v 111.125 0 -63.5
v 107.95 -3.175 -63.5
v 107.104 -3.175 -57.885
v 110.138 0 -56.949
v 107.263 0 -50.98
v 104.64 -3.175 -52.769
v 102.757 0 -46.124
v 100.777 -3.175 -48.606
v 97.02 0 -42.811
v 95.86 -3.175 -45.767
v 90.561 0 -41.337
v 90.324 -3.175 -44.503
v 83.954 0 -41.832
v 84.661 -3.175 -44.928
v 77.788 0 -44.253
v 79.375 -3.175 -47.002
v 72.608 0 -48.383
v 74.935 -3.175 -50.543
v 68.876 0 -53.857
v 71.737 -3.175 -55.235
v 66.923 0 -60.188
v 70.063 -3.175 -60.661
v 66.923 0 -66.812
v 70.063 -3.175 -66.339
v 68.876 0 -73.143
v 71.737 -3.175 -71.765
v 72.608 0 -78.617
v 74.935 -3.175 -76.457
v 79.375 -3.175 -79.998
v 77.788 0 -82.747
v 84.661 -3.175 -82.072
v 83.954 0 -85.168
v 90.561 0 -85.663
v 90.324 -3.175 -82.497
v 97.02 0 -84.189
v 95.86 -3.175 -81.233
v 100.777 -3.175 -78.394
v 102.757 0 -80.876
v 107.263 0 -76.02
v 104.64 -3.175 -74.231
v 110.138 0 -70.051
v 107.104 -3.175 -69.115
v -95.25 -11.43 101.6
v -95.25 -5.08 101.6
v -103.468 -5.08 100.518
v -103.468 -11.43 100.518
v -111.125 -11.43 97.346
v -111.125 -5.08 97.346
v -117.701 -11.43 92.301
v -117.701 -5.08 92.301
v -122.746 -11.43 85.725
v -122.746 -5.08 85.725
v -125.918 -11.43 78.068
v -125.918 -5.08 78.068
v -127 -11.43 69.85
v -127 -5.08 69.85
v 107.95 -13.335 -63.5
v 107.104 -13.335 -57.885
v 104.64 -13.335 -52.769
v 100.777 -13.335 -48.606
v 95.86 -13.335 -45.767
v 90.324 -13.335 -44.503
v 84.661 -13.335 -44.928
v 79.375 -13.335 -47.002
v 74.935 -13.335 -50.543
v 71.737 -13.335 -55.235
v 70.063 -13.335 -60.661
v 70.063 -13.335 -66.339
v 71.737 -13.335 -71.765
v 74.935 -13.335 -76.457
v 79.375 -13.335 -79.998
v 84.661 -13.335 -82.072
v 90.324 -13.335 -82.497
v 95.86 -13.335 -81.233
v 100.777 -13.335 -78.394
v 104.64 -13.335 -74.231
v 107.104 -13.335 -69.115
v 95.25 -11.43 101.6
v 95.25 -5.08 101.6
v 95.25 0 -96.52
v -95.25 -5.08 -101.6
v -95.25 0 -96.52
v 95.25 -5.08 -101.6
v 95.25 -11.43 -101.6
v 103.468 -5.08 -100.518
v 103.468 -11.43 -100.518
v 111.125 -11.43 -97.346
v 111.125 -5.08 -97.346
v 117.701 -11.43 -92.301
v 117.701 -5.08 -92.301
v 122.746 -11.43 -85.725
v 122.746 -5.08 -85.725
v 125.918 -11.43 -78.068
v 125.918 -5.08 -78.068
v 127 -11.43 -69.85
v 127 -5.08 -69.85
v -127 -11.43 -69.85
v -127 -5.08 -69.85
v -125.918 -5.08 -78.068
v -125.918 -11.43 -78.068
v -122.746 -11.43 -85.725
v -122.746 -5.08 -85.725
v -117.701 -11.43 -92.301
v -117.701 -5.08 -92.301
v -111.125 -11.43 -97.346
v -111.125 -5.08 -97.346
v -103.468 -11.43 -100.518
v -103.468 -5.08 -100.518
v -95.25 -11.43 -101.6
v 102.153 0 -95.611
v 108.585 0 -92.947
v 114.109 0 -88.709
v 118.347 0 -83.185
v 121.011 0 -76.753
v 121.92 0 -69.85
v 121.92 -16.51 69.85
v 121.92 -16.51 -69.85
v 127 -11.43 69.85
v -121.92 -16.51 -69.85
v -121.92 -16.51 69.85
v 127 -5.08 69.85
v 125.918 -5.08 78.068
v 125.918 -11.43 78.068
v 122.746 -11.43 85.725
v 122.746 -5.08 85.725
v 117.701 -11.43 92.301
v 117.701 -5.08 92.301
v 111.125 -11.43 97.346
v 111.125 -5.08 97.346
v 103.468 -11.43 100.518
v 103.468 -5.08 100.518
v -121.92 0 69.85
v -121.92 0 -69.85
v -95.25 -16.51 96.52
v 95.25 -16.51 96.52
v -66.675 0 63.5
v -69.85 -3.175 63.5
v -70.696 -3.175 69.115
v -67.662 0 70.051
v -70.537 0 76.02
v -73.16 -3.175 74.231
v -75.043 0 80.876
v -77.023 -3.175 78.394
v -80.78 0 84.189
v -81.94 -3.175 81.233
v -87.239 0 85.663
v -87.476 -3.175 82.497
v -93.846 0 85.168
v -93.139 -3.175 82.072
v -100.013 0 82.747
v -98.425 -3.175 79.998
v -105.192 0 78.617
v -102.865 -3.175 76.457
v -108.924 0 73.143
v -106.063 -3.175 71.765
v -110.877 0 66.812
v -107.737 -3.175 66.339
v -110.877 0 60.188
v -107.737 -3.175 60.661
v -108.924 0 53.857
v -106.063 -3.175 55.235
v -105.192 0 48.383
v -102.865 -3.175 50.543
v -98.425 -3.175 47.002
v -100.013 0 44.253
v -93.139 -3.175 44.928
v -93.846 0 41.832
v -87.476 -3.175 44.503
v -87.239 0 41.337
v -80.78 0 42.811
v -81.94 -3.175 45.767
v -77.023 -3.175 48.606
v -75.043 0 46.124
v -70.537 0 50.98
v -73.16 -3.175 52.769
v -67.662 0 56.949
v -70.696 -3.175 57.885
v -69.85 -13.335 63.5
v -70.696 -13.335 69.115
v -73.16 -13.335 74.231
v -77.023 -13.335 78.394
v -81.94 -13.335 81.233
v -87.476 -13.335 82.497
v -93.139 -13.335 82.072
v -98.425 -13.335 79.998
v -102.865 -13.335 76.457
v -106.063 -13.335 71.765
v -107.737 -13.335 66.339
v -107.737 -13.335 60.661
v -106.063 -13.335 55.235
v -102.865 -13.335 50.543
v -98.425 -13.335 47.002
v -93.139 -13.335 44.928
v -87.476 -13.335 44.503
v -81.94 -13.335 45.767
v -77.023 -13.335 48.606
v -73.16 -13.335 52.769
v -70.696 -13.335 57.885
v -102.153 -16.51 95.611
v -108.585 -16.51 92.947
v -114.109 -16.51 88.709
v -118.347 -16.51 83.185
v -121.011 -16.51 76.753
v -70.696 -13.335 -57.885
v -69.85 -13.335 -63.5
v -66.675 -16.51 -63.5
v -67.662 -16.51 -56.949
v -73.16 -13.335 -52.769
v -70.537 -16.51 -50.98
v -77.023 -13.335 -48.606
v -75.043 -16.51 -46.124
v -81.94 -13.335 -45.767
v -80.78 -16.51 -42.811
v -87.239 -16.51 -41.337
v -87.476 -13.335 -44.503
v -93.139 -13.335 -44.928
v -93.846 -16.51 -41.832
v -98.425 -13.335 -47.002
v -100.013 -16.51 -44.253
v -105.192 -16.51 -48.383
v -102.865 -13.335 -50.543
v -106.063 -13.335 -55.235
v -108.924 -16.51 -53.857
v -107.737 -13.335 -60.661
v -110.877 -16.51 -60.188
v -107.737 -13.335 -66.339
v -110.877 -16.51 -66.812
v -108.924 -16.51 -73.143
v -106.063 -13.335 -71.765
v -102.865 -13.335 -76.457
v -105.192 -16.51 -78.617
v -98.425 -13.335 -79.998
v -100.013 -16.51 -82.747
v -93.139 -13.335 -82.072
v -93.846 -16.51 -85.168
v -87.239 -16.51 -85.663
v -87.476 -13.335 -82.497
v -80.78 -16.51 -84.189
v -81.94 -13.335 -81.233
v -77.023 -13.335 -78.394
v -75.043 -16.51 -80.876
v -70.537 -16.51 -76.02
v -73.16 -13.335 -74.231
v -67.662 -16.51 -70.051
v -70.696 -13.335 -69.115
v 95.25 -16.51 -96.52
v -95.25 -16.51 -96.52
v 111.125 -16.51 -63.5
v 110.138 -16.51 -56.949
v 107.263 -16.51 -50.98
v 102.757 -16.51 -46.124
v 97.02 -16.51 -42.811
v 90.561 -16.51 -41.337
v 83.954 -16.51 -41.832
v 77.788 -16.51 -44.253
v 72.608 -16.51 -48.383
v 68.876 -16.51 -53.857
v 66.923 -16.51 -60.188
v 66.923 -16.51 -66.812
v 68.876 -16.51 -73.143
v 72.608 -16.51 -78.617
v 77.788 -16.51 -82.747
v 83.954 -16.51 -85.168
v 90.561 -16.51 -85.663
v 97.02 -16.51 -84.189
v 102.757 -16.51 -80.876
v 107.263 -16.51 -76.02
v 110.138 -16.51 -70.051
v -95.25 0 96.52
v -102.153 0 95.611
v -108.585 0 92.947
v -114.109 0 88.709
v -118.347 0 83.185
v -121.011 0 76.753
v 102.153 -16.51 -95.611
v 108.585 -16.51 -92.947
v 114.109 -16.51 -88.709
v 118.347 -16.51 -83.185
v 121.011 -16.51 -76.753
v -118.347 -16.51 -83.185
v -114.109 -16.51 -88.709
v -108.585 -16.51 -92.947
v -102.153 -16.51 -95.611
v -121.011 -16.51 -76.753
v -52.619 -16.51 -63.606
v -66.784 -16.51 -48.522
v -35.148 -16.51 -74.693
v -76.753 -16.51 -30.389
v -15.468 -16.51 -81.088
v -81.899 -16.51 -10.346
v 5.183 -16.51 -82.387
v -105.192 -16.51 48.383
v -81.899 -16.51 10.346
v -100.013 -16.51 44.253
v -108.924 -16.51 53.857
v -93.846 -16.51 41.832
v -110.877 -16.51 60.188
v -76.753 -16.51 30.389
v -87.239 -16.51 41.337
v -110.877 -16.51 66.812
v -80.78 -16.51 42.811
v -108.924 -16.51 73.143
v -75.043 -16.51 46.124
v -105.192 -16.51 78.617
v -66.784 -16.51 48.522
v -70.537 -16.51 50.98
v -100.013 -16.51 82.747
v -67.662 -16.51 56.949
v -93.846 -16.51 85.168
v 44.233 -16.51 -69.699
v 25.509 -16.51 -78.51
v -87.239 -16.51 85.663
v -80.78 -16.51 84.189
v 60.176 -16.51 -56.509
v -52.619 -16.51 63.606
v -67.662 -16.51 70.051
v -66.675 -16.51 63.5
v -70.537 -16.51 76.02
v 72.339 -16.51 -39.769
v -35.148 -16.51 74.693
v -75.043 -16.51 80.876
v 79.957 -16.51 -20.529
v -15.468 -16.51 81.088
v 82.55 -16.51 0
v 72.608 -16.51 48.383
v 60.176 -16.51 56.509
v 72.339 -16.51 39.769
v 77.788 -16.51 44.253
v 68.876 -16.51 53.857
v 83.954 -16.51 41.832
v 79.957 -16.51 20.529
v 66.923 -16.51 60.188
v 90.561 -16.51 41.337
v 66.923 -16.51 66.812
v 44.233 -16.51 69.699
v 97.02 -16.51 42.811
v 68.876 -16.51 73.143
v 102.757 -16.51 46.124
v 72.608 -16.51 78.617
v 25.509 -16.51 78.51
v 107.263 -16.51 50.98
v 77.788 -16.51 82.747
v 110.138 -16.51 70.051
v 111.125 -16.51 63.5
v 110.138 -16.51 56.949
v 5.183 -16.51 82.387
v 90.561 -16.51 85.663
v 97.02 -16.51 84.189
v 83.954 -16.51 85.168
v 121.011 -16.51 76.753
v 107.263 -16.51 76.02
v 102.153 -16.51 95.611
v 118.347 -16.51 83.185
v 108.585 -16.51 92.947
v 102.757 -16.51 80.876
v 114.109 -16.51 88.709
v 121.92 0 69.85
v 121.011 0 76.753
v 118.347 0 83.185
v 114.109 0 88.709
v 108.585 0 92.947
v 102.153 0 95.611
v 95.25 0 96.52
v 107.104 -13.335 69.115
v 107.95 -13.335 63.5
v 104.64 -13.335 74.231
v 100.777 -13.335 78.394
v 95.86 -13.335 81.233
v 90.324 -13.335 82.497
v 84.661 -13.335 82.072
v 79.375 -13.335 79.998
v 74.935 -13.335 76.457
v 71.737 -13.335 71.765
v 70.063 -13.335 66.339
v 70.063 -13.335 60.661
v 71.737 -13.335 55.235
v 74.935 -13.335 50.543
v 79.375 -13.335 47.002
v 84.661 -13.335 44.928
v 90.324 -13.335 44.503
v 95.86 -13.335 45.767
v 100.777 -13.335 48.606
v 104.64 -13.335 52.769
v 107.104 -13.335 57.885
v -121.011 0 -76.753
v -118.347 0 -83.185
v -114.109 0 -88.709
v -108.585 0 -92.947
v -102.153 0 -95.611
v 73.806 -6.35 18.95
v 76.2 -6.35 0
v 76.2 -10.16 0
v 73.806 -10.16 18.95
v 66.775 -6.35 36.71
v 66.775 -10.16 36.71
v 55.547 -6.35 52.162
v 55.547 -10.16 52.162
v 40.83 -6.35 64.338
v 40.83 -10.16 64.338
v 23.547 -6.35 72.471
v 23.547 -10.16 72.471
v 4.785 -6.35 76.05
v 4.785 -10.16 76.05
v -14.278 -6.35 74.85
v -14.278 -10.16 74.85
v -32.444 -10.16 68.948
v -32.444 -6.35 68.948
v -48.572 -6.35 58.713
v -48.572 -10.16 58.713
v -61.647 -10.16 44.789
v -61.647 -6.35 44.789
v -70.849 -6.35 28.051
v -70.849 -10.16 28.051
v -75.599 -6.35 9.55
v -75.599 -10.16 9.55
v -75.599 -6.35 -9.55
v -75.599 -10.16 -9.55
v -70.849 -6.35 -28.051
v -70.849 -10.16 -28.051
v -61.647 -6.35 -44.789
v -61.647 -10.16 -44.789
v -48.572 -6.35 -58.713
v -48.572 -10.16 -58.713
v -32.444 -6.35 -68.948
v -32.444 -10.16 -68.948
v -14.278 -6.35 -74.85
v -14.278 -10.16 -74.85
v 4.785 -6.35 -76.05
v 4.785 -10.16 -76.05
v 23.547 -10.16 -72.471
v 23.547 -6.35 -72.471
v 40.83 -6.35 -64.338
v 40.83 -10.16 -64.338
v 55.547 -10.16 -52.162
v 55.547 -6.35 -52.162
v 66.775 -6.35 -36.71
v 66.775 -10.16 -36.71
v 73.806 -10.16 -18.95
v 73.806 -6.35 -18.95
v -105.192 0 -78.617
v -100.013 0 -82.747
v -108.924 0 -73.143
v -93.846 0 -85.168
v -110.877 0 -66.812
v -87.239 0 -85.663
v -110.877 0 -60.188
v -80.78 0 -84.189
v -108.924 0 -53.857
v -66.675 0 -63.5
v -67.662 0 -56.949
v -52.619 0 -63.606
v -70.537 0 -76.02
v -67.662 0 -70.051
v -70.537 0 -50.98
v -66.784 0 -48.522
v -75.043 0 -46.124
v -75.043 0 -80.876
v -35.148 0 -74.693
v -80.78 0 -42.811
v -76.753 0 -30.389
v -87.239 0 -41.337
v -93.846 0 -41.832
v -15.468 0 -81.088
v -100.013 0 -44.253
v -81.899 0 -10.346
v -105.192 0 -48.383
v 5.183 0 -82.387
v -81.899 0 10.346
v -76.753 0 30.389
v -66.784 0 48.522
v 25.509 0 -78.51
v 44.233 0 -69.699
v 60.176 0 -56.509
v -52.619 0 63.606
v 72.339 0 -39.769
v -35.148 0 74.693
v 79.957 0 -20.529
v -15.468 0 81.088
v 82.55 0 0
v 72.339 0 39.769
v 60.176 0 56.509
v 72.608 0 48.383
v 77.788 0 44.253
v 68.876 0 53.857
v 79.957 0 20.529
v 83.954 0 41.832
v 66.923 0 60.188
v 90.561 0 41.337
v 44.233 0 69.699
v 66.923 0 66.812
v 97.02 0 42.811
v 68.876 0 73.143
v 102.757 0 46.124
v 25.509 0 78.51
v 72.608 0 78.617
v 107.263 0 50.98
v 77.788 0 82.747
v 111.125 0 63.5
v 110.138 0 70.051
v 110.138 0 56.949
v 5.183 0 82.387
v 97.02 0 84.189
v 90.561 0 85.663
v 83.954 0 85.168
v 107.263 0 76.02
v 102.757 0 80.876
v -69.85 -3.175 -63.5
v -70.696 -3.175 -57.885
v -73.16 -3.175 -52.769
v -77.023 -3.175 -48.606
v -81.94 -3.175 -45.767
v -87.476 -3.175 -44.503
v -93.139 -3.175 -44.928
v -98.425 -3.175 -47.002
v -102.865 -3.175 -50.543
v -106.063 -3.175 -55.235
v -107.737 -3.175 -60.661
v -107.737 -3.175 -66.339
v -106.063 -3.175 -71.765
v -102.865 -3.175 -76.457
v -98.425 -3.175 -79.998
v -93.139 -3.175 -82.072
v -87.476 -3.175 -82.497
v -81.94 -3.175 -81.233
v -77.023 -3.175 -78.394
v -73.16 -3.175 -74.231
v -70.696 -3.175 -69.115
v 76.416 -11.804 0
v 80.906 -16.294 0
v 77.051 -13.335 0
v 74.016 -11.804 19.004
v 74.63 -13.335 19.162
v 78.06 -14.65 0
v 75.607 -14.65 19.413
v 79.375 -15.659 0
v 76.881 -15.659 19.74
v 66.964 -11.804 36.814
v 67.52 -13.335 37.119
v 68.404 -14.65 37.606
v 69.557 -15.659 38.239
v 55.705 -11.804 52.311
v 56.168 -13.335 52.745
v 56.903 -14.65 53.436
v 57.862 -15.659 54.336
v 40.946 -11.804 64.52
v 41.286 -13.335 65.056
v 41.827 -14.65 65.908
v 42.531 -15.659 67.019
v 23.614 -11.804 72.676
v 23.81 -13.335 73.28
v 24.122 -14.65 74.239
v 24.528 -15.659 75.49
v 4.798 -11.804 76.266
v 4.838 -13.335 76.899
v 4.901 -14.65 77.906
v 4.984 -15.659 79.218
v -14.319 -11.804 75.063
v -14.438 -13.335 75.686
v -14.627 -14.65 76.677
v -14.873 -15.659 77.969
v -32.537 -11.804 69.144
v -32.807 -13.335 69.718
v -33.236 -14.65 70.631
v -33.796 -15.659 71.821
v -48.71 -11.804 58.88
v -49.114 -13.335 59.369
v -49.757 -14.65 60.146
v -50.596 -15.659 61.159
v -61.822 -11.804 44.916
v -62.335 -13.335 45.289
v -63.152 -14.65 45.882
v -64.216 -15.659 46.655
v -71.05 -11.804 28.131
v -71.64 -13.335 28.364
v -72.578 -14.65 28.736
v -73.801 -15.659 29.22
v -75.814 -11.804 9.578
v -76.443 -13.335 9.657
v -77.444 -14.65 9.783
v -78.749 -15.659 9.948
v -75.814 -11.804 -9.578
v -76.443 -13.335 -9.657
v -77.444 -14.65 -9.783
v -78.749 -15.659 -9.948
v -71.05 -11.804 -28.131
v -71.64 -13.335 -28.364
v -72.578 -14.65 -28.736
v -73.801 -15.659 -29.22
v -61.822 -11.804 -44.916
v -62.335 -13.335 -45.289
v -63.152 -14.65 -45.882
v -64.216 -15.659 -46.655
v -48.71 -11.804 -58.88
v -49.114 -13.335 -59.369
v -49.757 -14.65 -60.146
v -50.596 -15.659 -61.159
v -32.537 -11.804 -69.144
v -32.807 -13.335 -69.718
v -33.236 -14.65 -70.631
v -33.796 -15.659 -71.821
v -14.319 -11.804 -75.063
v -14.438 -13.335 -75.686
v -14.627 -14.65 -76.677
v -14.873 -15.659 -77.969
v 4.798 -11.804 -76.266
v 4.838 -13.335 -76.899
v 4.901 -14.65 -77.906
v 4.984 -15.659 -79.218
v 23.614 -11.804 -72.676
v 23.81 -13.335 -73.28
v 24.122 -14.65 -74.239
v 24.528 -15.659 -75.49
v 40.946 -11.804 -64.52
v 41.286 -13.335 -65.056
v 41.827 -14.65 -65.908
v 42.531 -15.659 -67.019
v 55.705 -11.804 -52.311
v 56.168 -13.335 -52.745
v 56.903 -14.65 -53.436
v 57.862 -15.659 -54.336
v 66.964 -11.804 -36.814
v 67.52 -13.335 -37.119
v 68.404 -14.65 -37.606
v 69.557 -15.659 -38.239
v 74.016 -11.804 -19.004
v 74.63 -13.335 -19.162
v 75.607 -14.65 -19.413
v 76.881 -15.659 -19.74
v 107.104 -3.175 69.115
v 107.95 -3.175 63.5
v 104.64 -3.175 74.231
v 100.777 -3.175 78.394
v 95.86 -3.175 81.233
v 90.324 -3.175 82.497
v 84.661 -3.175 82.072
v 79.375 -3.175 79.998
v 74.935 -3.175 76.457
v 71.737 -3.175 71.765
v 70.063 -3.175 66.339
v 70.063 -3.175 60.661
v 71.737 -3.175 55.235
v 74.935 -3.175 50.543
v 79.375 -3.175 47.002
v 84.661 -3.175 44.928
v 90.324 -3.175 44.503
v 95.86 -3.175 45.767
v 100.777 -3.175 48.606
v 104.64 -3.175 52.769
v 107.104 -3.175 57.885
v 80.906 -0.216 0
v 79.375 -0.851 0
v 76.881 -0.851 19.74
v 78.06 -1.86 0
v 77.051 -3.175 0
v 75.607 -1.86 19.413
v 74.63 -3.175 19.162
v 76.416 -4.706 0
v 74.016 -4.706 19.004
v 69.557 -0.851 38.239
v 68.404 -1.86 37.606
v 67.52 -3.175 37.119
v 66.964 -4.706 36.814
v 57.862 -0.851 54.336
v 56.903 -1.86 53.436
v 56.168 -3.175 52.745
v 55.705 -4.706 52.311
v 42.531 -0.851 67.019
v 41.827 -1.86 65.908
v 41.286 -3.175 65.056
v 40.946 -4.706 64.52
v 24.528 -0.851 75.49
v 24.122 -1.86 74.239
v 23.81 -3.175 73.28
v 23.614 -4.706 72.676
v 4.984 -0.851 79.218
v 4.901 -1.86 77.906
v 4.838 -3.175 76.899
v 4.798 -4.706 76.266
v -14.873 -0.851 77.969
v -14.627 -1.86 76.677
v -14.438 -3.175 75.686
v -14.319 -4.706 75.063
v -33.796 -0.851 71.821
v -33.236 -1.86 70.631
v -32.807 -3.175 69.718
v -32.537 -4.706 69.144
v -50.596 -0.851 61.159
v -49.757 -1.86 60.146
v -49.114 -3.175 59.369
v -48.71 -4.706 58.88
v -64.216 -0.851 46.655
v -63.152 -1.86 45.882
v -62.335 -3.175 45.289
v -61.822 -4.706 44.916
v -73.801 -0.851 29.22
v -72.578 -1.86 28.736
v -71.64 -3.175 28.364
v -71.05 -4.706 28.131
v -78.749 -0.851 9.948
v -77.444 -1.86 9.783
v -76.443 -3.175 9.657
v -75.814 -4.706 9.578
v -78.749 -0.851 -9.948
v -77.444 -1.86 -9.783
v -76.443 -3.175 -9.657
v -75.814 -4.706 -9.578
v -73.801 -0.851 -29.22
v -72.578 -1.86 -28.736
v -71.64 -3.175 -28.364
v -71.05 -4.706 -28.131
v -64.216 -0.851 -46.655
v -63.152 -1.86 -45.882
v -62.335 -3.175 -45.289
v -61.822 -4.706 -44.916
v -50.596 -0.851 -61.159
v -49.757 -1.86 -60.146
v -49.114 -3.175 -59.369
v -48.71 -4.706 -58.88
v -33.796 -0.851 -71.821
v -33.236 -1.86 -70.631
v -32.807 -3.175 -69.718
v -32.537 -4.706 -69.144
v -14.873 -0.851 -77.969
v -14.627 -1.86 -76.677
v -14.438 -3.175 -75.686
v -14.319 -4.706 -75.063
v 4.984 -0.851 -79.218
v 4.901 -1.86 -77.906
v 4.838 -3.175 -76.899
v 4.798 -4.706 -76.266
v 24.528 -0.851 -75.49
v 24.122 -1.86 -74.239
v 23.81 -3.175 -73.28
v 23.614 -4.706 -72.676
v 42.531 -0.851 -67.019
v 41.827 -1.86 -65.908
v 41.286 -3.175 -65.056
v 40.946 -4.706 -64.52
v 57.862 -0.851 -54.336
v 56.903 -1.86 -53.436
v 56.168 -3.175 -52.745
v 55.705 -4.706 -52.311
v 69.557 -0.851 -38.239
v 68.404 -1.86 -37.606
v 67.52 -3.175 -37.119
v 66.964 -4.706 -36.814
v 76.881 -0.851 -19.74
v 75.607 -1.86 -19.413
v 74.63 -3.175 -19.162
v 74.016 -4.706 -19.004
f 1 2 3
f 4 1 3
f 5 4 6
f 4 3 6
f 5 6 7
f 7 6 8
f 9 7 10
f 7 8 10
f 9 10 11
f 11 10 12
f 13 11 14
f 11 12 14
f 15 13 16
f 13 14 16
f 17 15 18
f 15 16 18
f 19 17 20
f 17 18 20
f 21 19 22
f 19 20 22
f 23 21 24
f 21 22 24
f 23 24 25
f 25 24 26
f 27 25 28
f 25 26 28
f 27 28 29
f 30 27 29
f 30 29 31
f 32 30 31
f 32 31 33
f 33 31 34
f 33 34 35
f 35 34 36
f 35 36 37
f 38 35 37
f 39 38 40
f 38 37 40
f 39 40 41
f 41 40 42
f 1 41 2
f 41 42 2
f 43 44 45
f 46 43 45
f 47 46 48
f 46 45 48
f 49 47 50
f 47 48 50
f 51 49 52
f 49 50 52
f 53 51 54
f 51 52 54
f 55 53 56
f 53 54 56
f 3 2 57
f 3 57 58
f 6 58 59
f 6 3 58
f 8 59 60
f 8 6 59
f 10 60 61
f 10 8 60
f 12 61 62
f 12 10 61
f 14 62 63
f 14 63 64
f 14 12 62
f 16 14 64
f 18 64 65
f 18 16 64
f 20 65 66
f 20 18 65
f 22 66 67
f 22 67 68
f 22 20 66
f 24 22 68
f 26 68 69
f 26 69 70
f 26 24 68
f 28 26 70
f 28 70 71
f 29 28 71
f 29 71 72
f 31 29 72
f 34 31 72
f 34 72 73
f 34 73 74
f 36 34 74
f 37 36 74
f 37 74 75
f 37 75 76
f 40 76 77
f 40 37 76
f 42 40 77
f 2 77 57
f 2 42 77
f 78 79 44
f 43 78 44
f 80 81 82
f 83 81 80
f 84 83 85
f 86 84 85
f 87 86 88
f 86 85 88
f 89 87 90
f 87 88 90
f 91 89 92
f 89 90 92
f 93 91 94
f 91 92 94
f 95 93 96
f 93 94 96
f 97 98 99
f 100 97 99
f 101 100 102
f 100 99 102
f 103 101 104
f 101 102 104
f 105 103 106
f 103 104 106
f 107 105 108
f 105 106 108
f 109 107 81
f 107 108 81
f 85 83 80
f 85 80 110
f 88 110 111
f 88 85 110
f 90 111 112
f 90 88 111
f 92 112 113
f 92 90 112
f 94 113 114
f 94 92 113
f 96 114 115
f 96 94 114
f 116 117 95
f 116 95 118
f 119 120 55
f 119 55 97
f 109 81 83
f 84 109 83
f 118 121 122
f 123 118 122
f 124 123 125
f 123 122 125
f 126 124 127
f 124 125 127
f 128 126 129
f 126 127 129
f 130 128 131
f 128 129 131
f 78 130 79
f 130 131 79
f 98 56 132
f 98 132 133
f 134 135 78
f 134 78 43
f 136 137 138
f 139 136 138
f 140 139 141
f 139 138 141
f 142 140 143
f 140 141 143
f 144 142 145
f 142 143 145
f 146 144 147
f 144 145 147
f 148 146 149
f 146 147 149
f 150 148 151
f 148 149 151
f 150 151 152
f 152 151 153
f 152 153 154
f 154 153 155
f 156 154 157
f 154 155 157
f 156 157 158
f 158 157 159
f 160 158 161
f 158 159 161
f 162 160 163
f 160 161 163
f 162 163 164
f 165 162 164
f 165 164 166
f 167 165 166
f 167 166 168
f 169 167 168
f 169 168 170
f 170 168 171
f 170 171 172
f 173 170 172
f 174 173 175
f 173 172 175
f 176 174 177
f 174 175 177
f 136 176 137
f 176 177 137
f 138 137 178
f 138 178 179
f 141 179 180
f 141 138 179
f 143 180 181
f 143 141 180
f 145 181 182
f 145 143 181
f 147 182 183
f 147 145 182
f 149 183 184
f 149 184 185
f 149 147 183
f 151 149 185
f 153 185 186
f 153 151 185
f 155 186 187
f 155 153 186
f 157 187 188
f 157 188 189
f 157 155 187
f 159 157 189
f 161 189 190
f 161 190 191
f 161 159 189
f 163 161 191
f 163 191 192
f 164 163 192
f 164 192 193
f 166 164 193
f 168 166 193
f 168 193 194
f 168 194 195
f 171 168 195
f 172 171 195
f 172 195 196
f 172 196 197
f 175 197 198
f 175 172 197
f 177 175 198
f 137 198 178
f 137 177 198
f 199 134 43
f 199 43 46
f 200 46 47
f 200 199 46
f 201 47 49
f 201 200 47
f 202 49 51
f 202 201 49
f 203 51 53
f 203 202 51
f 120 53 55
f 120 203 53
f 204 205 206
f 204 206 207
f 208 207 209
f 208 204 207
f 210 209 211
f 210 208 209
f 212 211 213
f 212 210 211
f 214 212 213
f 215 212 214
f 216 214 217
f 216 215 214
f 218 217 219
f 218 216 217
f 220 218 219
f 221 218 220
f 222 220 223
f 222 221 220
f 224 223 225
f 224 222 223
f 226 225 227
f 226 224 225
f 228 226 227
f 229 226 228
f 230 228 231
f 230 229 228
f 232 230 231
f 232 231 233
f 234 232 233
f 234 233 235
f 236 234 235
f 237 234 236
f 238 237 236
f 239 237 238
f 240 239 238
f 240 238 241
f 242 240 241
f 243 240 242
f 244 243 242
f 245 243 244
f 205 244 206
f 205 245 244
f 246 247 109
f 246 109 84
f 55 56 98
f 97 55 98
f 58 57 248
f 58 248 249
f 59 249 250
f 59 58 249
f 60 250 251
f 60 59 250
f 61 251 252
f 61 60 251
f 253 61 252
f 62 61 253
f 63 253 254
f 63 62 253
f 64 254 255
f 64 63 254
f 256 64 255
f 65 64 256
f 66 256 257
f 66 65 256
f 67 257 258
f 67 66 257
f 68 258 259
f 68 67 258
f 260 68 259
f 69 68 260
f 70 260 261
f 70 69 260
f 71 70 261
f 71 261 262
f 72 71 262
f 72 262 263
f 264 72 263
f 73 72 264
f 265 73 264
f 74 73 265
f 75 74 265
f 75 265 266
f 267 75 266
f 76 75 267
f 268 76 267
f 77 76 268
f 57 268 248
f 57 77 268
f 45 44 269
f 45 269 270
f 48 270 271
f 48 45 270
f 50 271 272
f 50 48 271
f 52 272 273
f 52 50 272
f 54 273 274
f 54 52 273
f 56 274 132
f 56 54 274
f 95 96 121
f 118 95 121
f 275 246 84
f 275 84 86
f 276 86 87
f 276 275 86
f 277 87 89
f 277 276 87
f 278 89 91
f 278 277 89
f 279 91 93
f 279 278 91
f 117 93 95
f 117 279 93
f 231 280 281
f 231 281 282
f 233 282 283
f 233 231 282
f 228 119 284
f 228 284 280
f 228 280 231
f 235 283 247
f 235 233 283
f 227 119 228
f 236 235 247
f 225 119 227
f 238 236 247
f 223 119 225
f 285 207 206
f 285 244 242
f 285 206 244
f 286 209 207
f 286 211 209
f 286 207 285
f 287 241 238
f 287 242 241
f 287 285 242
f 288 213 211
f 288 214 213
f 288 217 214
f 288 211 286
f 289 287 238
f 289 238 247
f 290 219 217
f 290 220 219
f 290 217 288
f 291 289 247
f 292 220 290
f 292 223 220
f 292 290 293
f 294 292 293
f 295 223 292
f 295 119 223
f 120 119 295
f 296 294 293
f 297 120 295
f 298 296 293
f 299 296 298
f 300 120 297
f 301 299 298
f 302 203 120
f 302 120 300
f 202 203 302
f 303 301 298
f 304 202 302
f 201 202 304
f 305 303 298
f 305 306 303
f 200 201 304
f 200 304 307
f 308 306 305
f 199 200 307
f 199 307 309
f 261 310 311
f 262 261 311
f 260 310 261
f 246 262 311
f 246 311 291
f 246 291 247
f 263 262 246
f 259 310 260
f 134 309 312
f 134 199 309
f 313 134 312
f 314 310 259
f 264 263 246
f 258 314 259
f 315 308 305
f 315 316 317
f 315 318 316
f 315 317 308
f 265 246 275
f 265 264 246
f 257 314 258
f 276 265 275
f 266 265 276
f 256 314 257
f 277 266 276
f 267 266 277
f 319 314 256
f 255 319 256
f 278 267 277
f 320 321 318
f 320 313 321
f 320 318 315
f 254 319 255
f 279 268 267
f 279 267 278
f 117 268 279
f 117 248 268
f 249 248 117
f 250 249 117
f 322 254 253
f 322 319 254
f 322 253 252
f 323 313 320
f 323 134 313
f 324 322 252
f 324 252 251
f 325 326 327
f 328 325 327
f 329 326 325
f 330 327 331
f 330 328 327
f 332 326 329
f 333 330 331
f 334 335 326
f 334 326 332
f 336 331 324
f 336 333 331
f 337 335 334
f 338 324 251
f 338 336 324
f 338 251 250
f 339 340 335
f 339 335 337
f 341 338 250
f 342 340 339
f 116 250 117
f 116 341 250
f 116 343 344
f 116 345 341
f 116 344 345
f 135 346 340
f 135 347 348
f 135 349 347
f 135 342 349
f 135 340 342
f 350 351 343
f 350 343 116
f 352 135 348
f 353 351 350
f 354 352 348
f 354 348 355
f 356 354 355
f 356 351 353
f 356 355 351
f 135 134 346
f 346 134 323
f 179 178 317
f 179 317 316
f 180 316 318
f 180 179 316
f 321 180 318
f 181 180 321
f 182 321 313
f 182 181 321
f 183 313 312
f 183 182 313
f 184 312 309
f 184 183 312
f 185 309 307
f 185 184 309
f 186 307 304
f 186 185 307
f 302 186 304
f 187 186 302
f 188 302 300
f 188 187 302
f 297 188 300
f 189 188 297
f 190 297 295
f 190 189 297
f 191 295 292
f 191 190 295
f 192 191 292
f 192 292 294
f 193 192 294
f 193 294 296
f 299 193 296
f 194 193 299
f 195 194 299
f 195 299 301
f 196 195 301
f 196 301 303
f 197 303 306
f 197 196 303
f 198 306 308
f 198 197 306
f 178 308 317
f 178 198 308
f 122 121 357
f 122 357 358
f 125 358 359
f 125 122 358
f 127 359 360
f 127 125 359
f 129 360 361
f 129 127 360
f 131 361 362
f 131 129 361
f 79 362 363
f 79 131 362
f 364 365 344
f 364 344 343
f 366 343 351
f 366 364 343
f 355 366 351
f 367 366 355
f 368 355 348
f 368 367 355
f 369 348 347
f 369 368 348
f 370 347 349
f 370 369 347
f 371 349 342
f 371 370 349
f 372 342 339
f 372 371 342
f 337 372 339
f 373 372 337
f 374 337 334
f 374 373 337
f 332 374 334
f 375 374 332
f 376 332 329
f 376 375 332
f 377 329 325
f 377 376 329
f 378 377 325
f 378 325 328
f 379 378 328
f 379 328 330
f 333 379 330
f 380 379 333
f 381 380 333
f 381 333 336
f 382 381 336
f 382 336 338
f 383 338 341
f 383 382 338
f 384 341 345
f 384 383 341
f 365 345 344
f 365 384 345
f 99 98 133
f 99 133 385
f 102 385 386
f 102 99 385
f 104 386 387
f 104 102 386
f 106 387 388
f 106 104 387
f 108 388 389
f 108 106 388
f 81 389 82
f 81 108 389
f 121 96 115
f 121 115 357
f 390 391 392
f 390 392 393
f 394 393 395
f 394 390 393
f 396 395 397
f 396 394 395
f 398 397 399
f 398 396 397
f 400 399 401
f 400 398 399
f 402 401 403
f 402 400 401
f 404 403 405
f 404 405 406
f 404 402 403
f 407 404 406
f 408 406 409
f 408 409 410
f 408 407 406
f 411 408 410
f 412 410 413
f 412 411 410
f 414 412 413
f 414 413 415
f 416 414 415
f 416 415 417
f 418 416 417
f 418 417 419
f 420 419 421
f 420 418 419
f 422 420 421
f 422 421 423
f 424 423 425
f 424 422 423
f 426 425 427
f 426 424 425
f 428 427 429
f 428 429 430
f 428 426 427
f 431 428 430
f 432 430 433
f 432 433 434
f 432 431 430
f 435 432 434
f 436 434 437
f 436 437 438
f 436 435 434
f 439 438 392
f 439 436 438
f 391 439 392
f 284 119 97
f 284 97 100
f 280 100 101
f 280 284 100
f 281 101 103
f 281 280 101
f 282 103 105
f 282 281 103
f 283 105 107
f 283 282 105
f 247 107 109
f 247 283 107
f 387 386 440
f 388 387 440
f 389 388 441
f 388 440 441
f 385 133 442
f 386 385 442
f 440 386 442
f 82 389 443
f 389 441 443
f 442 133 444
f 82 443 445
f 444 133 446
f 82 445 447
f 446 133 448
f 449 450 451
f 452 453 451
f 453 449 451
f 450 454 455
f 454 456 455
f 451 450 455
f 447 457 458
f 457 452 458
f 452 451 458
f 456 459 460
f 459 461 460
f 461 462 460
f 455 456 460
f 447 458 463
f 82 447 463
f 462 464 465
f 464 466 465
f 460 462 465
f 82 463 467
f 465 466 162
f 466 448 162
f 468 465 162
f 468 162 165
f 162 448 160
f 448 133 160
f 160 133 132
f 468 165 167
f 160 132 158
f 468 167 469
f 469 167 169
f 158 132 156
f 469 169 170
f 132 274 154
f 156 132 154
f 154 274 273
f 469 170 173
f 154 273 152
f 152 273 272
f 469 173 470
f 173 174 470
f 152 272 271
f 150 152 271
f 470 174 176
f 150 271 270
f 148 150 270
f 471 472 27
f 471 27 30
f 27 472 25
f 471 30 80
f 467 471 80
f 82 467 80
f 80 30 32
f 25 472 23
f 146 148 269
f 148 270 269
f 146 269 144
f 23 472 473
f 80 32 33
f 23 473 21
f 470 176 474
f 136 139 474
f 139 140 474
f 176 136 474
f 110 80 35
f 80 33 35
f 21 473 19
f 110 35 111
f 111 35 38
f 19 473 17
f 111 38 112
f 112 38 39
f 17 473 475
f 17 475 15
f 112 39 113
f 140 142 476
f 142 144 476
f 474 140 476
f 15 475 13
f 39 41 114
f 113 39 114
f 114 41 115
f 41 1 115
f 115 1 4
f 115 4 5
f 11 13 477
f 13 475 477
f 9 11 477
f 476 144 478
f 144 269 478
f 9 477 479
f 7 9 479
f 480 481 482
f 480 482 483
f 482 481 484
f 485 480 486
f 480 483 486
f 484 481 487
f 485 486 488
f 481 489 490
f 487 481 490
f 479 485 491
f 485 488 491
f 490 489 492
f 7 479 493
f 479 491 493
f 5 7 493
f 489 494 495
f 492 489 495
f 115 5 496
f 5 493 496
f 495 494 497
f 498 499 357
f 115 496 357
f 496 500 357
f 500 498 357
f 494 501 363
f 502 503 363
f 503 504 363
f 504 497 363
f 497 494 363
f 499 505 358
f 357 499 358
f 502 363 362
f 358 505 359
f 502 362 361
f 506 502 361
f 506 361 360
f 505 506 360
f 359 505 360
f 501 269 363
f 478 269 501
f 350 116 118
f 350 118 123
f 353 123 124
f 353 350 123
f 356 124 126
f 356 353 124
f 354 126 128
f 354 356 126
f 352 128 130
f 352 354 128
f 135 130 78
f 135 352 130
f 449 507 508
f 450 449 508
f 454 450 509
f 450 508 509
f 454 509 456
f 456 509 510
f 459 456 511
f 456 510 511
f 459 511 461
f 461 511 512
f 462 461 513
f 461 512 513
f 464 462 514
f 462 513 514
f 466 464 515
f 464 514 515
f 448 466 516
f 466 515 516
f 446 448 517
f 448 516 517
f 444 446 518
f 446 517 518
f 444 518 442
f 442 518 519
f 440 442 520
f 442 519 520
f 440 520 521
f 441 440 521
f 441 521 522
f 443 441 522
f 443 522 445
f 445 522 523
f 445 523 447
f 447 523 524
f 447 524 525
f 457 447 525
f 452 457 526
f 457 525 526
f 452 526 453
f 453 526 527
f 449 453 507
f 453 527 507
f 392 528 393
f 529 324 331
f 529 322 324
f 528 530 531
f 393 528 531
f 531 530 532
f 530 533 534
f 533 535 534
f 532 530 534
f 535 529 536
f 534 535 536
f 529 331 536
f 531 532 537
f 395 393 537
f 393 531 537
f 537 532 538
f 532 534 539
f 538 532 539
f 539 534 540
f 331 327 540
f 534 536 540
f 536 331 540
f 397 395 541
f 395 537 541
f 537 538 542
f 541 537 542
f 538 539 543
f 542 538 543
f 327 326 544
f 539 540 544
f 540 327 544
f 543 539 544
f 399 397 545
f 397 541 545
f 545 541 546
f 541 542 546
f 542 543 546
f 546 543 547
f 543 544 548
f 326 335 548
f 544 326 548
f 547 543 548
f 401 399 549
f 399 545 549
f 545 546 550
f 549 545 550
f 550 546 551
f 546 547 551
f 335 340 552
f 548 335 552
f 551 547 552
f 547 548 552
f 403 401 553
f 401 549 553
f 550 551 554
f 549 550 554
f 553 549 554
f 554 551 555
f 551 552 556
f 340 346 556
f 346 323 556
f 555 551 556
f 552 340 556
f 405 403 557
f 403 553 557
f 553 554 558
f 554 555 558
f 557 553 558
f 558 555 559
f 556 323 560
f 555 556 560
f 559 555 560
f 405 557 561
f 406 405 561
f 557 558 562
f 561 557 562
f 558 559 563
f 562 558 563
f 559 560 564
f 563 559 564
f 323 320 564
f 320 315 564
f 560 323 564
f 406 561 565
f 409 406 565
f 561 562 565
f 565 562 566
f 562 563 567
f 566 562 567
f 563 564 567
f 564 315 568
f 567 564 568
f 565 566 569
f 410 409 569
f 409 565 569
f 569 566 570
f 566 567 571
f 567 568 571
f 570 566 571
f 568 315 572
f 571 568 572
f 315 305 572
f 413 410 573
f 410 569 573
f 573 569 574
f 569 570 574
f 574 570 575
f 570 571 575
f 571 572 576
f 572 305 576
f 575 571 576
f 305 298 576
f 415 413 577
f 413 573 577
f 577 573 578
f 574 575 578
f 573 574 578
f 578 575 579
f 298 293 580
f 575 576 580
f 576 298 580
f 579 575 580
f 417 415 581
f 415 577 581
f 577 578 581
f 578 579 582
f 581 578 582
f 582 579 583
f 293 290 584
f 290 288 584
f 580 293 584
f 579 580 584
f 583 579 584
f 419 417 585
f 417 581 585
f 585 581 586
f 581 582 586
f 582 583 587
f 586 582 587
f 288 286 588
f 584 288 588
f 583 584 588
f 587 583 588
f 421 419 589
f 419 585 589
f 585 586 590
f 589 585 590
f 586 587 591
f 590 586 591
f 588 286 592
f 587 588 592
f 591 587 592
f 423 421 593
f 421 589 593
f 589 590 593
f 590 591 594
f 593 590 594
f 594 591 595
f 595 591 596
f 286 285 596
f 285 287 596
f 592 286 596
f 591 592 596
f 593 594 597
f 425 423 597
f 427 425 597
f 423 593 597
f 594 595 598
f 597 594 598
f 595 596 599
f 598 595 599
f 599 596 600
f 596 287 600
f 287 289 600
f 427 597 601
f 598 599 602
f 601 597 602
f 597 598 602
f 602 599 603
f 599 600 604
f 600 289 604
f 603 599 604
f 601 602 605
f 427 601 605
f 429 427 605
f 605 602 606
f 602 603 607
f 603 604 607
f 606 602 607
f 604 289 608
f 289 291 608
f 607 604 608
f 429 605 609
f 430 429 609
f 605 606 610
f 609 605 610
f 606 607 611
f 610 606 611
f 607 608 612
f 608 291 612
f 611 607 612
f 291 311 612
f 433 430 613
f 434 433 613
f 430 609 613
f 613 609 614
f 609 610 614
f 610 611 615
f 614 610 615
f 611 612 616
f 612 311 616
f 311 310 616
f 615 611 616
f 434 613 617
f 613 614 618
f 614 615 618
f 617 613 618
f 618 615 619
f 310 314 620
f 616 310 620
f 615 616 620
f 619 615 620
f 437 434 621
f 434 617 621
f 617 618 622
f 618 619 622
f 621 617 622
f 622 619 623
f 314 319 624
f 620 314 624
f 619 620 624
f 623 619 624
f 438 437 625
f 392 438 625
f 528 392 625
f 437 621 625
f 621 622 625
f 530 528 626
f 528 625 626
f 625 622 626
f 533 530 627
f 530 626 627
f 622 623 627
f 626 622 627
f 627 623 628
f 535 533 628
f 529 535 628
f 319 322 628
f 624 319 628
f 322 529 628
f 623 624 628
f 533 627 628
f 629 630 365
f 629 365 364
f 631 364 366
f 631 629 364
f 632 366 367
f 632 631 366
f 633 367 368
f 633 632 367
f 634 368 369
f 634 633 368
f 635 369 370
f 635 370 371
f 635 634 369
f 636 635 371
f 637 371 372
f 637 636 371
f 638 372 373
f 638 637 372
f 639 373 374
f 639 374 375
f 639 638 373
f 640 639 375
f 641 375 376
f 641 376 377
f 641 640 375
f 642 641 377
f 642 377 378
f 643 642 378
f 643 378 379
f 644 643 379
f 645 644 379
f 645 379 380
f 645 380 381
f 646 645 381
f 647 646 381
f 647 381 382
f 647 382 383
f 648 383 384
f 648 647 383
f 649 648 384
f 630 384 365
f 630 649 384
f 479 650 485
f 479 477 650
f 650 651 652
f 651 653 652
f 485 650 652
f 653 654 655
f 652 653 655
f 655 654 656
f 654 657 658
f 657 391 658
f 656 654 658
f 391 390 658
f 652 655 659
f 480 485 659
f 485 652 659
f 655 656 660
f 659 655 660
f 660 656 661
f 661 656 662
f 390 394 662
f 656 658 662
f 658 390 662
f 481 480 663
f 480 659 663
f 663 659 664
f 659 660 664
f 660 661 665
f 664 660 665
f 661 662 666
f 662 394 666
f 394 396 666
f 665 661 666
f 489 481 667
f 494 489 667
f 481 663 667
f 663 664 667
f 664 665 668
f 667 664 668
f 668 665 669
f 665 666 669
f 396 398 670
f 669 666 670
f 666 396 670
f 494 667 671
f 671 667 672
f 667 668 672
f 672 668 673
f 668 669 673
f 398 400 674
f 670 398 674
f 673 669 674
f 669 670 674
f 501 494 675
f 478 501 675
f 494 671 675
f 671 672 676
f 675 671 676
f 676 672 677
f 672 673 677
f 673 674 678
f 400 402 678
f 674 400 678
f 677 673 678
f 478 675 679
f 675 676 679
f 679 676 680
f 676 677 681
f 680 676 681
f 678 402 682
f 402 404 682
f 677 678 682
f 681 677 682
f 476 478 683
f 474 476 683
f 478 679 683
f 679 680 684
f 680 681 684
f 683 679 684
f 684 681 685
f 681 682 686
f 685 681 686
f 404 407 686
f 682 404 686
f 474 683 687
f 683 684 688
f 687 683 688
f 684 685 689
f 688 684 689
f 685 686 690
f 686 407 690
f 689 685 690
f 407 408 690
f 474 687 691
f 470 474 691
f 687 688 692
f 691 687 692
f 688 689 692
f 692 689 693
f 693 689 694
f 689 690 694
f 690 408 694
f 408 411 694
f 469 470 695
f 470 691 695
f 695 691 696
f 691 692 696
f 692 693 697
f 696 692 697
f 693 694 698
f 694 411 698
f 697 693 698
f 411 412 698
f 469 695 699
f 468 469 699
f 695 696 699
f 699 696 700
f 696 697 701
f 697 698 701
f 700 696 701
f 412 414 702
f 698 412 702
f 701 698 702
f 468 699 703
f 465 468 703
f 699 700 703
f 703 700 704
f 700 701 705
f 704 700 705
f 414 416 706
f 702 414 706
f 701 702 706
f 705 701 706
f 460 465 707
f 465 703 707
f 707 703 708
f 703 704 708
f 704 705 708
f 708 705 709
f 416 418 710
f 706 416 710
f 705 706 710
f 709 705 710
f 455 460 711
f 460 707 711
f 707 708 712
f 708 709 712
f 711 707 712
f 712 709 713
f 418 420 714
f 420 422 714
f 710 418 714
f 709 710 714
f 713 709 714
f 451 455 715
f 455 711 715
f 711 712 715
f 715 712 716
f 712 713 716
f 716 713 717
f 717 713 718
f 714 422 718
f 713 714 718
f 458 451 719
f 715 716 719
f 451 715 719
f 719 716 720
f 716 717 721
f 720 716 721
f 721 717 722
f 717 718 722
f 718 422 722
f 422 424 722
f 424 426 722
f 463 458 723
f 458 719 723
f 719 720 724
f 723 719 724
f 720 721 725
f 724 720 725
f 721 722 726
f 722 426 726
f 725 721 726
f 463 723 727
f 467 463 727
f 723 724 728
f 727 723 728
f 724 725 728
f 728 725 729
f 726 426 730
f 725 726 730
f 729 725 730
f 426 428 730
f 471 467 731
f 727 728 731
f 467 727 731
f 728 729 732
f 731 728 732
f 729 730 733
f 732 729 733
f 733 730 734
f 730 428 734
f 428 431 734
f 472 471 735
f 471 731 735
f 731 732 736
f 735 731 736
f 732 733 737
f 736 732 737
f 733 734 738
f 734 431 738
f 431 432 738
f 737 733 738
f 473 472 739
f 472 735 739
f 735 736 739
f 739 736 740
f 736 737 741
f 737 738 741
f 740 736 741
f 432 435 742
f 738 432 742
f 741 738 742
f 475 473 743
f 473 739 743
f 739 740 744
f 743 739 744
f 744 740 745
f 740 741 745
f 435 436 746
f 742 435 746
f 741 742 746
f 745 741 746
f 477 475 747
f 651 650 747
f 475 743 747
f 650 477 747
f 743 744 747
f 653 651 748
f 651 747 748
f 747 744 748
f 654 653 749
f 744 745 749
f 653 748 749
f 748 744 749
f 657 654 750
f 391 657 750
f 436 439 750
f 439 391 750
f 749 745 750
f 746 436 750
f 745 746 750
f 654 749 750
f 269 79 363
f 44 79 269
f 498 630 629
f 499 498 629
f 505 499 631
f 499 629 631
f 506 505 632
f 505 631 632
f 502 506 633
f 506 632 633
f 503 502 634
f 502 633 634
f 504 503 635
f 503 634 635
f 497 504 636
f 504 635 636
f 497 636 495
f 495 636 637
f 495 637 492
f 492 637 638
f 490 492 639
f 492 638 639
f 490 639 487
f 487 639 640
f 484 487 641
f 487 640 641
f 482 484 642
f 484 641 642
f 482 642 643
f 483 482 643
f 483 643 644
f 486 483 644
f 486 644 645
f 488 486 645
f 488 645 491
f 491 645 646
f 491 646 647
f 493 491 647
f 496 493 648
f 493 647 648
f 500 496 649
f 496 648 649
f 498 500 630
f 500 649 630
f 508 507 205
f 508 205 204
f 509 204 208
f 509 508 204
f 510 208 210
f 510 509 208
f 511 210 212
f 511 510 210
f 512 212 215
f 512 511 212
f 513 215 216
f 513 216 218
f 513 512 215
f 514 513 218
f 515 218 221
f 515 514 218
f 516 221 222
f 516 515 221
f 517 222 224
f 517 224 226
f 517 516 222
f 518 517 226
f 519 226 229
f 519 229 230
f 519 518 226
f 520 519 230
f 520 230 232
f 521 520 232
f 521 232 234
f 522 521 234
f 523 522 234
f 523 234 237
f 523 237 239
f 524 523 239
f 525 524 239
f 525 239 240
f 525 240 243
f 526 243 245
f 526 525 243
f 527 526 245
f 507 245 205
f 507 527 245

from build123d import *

# Parameters (mm, degrees)
F0_R     = 19.05
F0_R_2   = 76.2
F1_DEPTH = 16.51
F2_SIZE  = 5.08
F3_SIZE  = 5.08
F4_SIZE  = 3.175
F5_R     = 6.35


with BuildPart() as f1:
    # F0 (on Front) → F1 (new body)
    with BuildSketch(Plane.XZ):
        with BuildLine():
            Line((95.25, 101.6), (-95.25, 101.6))
            ThreePointArc((-95.25, 101.6), (-117.70064, 92.30064), (-127, 69.85))
            Line((-127, 69.85), (-127, -69.85))
            ThreePointArc((-127, -69.85), (-117.70064, -92.30064), (-95.25, -101.6))
            Line((-95.25, -101.6), (95.25, -101.6))
            ThreePointArc((95.25, -101.6), (117.70064, -92.30064), (127, -69.85))
            Line((127, -69.85), (127, 69.85))
            ThreePointArc((127, 69.85), (117.70064, 92.30064), (95.25, 101.6))
        make_face()
        with Locations((-88.9, -63.5)):
            Circle(F0_R, mode=Mode.SUBTRACT)
        with Locations((88.9, -63.5)):
            Circle(F0_R, mode=Mode.SUBTRACT)
        Circle(F0_R_2, mode=Mode.SUBTRACT)
        with Locations((-88.9, 63.5)):
            Circle(F0_R, mode=Mode.SUBTRACT)
        with Locations((88.9, 63.5)):
            Circle(F0_R, mode=Mode.SUBTRACT)
    extrude(amount=F1_DEPTH)

    # F2
    f2_edges = [f1.edges().sort_by_distance(p)[0] for p in [
        (0, -16.51, 101.6),
        (-117.70064, -16.51, 92.30064),
    ]]
    chamfer(f2_edges, length=F2_SIZE)

    # F3
    f3_edges = [f1.edges().sort_by_distance(p)[0] for p in [
        (127, 0, 0),
    ]]
    chamfer(f3_edges, length=F3_SIZE)

    # F4
    f4_edges = [f1.edges().sort_by_distance(p)[0] for p in [
        (-107.95, -16.51, 63.5),
        (69.85, -16.51, 63.5),
        (69.85, -16.51, -63.5),
        (-107.95, -16.51, -63.5),
        (-107.95, 0, 63.5),
        (69.85, 0, 63.5),
        (69.85, 0, -63.5),
        (-107.95, 0, -63.5),
    ]]
    chamfer(f4_edges, length=F4_SIZE)

    # F5
    f5_edges = [f1.edges().sort_by_distance(p)[0] for p in [
        (-76.2, 0, 0),
        (-76.2, -16.51, 0),
    ]]
    fillet(f5_edges, radius=F5_R)


solid = f1.part
